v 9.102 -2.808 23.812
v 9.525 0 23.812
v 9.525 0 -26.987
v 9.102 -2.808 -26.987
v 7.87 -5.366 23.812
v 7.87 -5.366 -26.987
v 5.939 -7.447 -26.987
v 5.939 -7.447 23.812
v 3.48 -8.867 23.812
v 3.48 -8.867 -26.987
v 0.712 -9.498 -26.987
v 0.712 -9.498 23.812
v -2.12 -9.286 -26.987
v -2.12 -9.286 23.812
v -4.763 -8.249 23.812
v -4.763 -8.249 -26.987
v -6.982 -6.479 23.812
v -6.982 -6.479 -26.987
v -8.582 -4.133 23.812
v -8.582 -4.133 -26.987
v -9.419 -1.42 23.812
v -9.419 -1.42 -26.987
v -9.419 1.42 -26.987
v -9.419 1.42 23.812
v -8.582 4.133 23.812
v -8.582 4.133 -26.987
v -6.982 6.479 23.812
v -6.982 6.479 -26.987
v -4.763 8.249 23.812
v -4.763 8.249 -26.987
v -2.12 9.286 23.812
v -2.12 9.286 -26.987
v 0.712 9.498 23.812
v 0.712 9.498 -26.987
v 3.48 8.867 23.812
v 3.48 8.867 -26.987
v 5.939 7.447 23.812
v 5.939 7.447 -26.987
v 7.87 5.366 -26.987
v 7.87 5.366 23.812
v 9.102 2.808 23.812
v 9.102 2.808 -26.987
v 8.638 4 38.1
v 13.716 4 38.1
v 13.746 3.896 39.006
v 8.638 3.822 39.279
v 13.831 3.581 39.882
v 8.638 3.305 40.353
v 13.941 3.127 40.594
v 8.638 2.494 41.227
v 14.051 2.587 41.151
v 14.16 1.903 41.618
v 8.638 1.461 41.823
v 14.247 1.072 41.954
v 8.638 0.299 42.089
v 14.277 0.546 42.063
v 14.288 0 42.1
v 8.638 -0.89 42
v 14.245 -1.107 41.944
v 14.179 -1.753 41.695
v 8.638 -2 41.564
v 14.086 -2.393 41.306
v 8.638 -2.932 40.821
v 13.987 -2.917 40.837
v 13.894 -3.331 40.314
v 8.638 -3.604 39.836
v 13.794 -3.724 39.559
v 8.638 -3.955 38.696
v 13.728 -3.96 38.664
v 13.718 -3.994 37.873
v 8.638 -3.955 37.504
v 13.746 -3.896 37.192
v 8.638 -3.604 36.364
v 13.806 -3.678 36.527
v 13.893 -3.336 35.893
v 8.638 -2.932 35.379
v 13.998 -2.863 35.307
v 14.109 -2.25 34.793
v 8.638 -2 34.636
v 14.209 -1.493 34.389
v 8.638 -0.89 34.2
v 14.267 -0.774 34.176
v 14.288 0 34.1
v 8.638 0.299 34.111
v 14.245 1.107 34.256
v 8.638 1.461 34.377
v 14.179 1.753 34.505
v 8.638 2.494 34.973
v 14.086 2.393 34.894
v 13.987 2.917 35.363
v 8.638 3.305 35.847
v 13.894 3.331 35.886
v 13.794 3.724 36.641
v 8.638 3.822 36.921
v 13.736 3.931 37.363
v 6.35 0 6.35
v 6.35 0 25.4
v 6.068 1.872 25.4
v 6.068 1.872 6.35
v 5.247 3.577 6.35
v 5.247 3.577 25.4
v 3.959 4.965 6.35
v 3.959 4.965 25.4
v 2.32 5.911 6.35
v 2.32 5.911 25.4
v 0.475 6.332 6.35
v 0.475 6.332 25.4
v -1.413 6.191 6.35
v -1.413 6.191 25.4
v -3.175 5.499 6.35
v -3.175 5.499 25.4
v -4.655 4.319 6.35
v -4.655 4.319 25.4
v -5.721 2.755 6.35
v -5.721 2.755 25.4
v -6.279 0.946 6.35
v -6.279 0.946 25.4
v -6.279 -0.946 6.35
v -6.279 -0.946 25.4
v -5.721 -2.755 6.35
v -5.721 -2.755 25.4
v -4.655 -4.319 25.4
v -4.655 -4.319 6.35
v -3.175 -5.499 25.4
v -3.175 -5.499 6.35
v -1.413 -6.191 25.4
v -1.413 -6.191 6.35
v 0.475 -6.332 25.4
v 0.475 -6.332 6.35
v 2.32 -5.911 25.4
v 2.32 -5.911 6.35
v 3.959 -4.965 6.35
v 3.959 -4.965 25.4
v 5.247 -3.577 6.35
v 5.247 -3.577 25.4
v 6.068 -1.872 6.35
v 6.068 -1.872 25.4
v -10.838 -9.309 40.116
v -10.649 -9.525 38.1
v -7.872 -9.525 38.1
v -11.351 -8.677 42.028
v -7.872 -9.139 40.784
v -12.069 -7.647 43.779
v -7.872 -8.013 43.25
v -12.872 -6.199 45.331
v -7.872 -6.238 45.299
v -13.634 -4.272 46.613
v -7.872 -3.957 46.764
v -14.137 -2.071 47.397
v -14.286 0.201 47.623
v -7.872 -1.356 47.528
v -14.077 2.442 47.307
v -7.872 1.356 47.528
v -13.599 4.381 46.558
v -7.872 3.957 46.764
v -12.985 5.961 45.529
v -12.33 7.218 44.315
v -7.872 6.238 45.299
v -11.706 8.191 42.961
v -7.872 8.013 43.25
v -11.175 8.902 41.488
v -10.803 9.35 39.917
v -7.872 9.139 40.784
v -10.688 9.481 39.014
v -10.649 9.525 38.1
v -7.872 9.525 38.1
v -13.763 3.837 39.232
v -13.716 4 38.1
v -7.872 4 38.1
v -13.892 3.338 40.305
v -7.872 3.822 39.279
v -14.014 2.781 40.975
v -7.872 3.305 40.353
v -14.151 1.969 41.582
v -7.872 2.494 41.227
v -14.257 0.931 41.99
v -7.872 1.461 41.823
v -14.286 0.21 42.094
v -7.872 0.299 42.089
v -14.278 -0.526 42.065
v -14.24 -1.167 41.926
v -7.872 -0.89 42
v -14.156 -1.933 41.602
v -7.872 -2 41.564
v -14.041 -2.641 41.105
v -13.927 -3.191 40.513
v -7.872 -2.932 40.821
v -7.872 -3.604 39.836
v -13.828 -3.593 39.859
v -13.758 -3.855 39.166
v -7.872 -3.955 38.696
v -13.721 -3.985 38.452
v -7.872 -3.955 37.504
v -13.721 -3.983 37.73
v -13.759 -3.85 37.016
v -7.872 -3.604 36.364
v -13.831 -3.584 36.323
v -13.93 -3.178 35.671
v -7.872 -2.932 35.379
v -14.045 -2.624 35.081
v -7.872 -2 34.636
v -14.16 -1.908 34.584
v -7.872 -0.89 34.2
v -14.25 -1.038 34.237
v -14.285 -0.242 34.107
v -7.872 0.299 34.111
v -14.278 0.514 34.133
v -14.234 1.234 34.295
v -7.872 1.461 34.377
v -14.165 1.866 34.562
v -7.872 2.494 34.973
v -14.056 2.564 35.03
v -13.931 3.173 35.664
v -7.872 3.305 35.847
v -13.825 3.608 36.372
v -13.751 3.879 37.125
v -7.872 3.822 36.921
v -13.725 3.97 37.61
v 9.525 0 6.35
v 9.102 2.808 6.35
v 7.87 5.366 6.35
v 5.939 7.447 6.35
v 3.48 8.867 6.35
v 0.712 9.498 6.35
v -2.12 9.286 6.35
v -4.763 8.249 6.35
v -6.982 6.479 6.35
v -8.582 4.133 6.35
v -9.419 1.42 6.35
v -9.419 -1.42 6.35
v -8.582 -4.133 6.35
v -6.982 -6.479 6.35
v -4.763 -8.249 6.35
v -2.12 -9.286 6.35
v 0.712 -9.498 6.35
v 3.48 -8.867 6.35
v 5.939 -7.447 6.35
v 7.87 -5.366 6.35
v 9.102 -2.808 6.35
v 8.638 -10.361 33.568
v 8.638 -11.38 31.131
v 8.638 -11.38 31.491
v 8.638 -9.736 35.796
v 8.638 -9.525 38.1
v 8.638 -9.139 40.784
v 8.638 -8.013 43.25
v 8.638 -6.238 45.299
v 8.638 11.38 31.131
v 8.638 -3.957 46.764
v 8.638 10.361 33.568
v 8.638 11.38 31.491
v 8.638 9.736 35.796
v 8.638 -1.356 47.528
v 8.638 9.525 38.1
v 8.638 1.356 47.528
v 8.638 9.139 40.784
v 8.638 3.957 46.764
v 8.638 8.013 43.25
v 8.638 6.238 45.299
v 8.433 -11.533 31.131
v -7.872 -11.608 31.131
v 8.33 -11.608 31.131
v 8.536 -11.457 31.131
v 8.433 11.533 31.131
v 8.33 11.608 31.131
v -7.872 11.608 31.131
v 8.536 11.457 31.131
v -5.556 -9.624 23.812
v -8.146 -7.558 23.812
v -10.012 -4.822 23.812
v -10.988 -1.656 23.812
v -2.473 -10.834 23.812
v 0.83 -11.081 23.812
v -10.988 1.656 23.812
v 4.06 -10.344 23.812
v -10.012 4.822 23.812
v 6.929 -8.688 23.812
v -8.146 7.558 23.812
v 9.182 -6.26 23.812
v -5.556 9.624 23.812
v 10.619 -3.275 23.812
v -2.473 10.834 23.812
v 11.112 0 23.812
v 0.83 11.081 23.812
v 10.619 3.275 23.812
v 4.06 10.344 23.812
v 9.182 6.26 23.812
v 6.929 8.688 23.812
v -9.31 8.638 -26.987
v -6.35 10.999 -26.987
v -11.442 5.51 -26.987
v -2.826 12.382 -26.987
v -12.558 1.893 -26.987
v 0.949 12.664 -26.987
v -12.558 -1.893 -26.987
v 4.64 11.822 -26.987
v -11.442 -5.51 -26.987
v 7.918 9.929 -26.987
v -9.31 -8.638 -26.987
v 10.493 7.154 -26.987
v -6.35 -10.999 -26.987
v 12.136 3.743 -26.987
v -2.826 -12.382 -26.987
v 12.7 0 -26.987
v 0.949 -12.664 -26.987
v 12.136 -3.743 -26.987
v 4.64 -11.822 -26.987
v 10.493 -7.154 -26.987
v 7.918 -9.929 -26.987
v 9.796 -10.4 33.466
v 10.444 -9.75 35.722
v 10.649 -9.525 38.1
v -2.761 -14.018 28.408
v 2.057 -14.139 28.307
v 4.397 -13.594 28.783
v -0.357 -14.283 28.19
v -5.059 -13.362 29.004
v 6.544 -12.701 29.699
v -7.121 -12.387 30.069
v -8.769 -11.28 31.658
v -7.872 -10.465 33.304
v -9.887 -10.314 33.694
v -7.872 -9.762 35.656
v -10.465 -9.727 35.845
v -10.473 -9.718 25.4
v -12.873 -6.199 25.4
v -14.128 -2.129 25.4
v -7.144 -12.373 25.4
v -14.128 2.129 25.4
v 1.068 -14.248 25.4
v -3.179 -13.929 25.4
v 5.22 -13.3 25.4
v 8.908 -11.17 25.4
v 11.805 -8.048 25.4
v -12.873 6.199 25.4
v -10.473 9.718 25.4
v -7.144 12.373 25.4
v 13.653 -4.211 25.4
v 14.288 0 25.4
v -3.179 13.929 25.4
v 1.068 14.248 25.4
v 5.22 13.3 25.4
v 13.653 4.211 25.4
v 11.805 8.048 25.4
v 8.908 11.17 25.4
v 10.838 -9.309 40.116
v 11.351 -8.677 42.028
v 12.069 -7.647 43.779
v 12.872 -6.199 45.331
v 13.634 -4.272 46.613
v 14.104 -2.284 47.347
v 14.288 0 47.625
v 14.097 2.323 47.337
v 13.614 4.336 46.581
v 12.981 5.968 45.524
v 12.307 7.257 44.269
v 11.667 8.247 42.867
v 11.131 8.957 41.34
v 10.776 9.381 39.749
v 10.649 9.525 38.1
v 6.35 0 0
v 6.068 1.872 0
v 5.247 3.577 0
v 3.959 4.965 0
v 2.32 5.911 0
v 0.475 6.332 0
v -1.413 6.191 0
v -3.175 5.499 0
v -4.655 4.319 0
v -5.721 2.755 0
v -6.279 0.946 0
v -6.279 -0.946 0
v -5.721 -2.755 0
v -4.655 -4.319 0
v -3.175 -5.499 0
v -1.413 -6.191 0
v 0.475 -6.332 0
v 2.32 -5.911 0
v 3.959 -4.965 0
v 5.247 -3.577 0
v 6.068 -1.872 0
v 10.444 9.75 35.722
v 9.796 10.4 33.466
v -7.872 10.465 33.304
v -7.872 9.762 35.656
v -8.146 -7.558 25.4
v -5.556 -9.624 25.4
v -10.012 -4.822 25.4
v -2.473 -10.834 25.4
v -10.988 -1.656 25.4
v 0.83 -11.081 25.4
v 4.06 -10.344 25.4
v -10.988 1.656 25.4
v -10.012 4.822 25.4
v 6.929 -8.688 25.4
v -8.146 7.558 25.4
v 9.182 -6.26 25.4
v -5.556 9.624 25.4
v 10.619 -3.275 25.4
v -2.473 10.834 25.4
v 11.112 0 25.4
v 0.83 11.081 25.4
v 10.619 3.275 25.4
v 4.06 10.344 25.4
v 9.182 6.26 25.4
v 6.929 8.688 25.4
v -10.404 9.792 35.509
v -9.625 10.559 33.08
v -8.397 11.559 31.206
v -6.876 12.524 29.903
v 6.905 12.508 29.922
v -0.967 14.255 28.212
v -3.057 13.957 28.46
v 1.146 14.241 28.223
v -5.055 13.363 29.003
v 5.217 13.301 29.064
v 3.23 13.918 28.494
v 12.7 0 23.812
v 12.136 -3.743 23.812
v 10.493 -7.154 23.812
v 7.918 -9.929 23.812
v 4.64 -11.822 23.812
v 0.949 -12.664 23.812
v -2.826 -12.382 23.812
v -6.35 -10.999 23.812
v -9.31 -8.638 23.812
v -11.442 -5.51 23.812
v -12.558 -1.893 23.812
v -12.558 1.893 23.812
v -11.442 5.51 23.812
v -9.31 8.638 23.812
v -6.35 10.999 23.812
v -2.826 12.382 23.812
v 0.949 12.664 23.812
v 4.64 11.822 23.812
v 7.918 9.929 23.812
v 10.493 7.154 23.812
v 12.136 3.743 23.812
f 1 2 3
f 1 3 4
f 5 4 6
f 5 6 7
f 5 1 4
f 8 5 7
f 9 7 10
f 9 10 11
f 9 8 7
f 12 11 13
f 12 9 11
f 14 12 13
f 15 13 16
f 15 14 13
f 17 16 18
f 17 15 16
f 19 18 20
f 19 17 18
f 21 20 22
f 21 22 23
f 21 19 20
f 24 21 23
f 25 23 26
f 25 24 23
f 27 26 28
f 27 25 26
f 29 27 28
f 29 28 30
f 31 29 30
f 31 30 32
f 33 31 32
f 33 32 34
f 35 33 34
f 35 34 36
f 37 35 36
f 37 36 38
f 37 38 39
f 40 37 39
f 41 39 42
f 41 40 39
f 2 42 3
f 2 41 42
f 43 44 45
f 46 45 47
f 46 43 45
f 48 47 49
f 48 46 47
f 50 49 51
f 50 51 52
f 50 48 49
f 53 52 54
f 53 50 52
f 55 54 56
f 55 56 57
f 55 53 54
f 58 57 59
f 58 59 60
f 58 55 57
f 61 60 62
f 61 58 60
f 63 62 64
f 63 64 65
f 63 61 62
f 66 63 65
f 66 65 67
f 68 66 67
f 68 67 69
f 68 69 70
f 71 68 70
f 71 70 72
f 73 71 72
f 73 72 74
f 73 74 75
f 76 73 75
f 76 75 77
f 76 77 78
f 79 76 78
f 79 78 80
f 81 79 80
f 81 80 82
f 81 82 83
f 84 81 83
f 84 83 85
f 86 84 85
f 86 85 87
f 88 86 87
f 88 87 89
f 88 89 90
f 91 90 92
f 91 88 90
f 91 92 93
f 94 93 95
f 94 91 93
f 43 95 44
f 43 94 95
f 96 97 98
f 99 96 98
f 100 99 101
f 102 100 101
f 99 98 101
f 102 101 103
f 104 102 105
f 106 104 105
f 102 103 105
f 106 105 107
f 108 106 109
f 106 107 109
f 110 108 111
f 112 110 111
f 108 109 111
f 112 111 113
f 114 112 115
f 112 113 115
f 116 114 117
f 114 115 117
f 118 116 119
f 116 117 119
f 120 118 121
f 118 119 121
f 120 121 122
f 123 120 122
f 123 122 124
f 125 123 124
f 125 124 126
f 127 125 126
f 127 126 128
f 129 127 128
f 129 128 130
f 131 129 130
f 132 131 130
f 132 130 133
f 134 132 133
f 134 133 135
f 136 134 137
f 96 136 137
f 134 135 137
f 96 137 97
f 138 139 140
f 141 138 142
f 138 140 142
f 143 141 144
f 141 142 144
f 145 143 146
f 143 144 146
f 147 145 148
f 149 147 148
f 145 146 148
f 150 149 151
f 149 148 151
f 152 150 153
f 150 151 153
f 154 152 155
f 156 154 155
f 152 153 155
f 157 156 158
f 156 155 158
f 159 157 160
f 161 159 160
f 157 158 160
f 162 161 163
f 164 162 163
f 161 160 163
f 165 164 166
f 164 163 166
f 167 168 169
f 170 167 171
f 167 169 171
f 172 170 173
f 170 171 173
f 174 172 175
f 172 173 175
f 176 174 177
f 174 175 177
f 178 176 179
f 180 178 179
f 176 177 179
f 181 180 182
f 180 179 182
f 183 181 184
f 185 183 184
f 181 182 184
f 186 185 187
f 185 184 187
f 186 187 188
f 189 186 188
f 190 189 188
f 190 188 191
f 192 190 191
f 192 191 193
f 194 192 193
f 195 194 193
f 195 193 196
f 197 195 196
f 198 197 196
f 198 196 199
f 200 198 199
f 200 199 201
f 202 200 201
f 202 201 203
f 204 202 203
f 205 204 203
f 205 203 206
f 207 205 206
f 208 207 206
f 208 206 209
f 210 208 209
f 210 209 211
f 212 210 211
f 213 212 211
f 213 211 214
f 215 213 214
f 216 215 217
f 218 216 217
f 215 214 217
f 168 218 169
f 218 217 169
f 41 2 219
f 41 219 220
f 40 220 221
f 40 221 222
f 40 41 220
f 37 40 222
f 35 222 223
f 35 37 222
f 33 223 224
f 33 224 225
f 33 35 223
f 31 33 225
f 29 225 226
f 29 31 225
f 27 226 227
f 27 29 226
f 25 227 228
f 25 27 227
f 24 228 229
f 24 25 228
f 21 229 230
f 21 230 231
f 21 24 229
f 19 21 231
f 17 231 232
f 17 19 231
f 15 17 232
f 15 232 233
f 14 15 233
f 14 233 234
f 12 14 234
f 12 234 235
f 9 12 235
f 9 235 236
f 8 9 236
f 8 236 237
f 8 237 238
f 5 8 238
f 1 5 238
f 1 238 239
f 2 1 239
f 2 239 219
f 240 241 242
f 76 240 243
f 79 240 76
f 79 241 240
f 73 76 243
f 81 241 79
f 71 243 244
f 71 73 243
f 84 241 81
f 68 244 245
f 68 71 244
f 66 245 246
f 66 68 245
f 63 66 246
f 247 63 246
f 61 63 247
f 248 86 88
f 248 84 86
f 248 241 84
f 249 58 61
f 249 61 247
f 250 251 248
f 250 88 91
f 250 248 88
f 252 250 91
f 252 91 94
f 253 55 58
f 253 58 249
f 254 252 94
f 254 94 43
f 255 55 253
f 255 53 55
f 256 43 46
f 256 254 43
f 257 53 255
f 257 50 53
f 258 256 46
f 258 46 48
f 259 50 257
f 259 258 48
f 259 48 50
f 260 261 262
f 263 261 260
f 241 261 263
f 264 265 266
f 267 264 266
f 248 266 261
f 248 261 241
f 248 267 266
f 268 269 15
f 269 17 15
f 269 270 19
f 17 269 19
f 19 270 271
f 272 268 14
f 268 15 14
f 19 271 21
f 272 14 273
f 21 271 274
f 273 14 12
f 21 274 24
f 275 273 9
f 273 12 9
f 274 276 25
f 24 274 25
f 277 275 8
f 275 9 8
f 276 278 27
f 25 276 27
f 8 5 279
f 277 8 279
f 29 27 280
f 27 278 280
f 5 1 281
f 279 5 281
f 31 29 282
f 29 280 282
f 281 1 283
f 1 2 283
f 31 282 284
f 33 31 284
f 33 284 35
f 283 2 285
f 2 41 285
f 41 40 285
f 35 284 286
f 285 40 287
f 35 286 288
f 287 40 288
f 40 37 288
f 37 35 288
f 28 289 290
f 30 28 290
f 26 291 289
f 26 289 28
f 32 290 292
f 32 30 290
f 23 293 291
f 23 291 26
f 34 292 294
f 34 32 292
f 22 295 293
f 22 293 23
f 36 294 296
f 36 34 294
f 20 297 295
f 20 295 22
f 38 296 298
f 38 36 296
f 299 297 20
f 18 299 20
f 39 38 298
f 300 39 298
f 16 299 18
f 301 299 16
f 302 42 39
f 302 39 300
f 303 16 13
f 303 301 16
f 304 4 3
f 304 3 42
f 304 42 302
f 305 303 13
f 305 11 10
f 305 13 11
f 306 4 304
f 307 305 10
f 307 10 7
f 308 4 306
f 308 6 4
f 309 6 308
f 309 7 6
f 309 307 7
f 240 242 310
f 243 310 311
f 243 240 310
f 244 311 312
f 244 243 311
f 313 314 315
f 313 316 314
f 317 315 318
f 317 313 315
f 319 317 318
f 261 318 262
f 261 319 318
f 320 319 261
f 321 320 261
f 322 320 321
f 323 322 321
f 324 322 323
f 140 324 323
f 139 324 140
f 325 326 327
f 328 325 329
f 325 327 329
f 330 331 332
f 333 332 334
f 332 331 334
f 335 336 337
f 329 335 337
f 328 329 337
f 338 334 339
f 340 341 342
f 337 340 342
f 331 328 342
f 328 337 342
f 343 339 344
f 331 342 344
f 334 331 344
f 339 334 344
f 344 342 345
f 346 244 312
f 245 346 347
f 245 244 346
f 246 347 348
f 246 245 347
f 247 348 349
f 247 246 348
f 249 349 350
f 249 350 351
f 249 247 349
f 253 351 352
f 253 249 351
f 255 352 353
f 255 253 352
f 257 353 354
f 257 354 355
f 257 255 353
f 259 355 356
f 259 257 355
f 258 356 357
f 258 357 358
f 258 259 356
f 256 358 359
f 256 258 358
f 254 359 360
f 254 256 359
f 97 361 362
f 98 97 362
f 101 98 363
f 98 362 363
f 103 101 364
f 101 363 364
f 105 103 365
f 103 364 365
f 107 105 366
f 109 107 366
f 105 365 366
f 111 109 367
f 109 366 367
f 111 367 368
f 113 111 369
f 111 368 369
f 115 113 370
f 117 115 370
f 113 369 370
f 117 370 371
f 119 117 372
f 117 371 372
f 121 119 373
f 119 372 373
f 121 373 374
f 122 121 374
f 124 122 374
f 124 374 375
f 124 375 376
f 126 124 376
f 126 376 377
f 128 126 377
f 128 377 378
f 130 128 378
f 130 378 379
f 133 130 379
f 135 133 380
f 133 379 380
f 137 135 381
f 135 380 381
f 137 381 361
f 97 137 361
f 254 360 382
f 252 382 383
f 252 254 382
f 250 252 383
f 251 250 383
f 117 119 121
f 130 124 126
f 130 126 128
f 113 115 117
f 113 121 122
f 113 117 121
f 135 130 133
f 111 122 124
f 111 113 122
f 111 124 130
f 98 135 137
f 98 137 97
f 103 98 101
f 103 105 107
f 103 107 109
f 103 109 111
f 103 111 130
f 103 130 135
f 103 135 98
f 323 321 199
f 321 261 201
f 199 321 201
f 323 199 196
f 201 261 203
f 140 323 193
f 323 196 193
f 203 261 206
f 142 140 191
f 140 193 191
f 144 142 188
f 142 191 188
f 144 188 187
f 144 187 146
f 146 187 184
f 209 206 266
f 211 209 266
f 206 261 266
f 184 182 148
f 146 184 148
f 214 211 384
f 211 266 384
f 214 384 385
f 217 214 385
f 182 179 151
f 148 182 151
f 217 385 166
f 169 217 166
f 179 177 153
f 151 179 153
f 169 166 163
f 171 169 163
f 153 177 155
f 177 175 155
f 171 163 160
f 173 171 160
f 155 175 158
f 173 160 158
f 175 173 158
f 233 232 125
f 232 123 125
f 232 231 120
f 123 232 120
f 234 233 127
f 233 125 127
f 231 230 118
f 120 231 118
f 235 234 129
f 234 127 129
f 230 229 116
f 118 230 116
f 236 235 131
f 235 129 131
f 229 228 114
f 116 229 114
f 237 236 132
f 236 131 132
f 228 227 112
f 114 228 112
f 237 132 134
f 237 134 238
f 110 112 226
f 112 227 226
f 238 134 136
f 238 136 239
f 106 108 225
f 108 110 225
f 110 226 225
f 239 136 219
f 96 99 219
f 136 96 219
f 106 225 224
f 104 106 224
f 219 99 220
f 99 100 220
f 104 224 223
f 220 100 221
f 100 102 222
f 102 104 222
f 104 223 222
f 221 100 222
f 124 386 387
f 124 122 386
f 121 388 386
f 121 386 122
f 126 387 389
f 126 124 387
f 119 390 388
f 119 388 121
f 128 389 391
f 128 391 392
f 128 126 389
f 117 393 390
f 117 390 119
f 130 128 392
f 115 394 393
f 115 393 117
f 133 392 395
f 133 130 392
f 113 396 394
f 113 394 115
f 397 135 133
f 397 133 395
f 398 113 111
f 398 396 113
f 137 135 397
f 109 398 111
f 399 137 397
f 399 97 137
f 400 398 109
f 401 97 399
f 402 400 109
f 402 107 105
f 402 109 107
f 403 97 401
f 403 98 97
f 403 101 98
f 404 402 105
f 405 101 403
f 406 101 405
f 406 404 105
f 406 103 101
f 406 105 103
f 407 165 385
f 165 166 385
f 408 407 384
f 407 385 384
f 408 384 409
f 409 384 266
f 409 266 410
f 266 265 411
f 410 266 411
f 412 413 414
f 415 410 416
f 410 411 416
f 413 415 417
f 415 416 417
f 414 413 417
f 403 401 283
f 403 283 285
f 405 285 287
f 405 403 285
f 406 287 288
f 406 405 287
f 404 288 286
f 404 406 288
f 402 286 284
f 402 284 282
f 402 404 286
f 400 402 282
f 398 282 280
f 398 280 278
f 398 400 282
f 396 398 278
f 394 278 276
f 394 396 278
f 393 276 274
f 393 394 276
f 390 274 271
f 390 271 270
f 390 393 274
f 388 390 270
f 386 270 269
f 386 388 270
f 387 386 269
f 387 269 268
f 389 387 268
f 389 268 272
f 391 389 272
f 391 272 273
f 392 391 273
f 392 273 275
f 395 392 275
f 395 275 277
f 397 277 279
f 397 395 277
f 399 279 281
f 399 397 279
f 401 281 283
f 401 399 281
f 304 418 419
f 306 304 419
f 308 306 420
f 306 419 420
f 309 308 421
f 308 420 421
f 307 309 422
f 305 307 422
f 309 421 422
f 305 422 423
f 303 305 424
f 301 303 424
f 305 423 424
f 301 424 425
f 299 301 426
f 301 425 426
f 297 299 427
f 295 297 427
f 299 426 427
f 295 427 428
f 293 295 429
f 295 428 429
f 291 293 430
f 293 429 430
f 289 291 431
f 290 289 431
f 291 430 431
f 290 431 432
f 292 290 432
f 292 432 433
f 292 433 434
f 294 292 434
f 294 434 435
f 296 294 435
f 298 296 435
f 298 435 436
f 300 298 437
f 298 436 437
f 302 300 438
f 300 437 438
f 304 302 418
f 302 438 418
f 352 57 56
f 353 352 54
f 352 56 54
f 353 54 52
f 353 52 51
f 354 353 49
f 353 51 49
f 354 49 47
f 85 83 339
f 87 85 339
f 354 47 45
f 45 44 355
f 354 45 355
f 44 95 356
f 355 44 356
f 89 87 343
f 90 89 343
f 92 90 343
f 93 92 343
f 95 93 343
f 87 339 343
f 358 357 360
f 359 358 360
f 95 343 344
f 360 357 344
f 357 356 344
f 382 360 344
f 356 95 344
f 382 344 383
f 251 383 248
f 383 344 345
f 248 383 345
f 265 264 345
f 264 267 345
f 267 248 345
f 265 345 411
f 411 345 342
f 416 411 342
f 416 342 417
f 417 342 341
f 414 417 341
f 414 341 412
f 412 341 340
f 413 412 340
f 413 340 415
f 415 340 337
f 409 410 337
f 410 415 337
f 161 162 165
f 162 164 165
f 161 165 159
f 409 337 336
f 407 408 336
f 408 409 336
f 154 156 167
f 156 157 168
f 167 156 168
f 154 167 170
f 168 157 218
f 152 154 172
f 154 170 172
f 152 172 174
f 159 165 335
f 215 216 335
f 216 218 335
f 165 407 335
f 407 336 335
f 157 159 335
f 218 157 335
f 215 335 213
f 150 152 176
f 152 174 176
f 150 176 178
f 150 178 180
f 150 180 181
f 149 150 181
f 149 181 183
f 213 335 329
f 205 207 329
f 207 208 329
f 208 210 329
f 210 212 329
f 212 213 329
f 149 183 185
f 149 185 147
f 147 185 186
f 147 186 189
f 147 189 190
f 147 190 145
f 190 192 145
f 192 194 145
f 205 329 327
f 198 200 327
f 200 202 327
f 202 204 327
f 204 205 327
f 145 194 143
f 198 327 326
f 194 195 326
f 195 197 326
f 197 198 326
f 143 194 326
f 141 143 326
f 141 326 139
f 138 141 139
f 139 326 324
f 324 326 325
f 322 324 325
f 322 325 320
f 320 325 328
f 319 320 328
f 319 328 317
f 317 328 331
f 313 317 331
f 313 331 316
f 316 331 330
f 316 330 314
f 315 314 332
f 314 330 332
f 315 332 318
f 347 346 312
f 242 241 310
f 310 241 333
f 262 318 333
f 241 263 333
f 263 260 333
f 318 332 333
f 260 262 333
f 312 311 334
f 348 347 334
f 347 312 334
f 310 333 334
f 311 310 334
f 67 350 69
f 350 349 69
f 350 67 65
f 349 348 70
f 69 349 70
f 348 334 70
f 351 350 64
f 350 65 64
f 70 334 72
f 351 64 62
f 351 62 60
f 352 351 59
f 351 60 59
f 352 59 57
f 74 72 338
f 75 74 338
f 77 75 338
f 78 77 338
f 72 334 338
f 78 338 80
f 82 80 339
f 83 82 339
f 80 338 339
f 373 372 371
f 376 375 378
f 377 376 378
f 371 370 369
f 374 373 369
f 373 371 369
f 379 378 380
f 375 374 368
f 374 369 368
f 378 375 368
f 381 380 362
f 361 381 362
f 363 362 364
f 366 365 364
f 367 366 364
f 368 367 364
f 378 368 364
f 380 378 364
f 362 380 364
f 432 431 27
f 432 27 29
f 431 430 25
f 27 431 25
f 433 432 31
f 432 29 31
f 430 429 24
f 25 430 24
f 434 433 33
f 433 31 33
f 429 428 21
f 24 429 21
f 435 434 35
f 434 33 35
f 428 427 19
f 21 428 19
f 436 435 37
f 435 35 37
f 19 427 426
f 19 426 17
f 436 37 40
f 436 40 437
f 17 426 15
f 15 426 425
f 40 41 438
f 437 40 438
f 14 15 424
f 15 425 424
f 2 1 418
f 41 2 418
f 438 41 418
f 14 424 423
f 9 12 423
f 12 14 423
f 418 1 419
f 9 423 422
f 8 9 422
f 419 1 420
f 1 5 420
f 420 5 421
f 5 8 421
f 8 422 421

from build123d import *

# Parameters (mm, degrees)
F0_R           = 6.35
F1_DEPTH       = 25.4
F2_R           = 9.525
F2_R_2         = 6.35
F3_DEPTH       = 19.05
F2_R_3         = 11.1125
F4_DEPTH       = 1.5875
F5_R           = 12.7
F5_R_2         = 9.525
F6_DEPTH       = 50.8
F7_R           = 14.2875
F8_DEPTH       = 25.4
F9_R           = 4
F10_DEPTH      = 25.4
F10_DEPTH_BACK = 25.4
F11_W          = 16.51
F11_H          = 21.4139607947
F12_DEPTH      = 25.4
F12_DEPTH_BACK = 25.4


with BuildPart() as f1:
    # F0 (on Top) → F1 (new body)
    with BuildSketch(Plane.XY):
        Circle(F0_R)
    extrude(amount=F1_DEPTH)


with BuildPart() as f3:
    # F2 (on face) → F3 (new body)
    with BuildSketch(Plane.XY.offset(25.4)):
        Circle(F2_R)
        Circle(F2_R_2, mode=Mode.SUBTRACT)
    extrude(amount=-F3_DEPTH)

    # F2 (on face) → F4 (join)
    with BuildSketch(Plane.XY.offset(25.4)):
        Circle(F2_R_3)
        Circle(F2_R, mode=Mode.SUBTRACT)
    extrude(amount=-F4_DEPTH)


with BuildPart() as f6:
    # F5 (on face) → F6 (new body)
    with BuildSketch(Plane(origin=(0, 0, 23.8125), x_dir=(1, 0, 0), z_dir=(0, 0, -1))):
        Circle(F5_R)
        Circle(F5_R_2, mode=Mode.SUBTRACT)
    extrude(amount=F6_DEPTH)


with BuildPart() as f8:
    # F7 (on face) → F8 (new body)
    with BuildSketch(Plane.XY.offset(25.4)):
        Circle(F7_R)
    extrude(amount=F8_DEPTH)

    # F9 (on Right) → F10 (cut, two sides)
    with BuildSketch(Plane.YZ) as f10_sk:
        with Locations((0, 38.1)):
            Circle(F9_R)
        with BuildLine():
            ThreePointArc((-9.525, 38.1), (0, 47.625), (9.525, 38.1))
            ThreePointArc((9.525, 38.1), (22.225, 25.4), (34.925, 38.1))
            Line((34.925, 38.1), (34.925, 62.9070408605))
            Line((34.925, 62.9070408605), (-34.925, 62.9070408605))
            Line((-34.925, 62.9070408605), (-34.925, 38.1))
            ThreePointArc((-34.925, 38.1), (-22.225, 25.4), (-9.525, 38.1))
        make_face()
    extrude(amount=-F10_DEPTH, mode=Mode.SUBTRACT)
    extrude(f10_sk.sketch, amount=F10_DEPTH_BACK, mode=Mode.SUBTRACT)

    # F11 (on Front) → F12 (cut, two sides)
    with BuildSketch(Plane.XZ) as f12_sk:
        with Locations((0.383426901, 41.8379120529)):
            Rectangle(F11_W, F11_H)
    extrude(amount=-F12_DEPTH, mode=Mode.SUBTRACT)
    extrude(f12_sk.sketch, amount=F12_DEPTH_BACK, mode=Mode.SUBTRACT)


solid = Compound([f1.part, f3.part, f6.part, f8.part])
